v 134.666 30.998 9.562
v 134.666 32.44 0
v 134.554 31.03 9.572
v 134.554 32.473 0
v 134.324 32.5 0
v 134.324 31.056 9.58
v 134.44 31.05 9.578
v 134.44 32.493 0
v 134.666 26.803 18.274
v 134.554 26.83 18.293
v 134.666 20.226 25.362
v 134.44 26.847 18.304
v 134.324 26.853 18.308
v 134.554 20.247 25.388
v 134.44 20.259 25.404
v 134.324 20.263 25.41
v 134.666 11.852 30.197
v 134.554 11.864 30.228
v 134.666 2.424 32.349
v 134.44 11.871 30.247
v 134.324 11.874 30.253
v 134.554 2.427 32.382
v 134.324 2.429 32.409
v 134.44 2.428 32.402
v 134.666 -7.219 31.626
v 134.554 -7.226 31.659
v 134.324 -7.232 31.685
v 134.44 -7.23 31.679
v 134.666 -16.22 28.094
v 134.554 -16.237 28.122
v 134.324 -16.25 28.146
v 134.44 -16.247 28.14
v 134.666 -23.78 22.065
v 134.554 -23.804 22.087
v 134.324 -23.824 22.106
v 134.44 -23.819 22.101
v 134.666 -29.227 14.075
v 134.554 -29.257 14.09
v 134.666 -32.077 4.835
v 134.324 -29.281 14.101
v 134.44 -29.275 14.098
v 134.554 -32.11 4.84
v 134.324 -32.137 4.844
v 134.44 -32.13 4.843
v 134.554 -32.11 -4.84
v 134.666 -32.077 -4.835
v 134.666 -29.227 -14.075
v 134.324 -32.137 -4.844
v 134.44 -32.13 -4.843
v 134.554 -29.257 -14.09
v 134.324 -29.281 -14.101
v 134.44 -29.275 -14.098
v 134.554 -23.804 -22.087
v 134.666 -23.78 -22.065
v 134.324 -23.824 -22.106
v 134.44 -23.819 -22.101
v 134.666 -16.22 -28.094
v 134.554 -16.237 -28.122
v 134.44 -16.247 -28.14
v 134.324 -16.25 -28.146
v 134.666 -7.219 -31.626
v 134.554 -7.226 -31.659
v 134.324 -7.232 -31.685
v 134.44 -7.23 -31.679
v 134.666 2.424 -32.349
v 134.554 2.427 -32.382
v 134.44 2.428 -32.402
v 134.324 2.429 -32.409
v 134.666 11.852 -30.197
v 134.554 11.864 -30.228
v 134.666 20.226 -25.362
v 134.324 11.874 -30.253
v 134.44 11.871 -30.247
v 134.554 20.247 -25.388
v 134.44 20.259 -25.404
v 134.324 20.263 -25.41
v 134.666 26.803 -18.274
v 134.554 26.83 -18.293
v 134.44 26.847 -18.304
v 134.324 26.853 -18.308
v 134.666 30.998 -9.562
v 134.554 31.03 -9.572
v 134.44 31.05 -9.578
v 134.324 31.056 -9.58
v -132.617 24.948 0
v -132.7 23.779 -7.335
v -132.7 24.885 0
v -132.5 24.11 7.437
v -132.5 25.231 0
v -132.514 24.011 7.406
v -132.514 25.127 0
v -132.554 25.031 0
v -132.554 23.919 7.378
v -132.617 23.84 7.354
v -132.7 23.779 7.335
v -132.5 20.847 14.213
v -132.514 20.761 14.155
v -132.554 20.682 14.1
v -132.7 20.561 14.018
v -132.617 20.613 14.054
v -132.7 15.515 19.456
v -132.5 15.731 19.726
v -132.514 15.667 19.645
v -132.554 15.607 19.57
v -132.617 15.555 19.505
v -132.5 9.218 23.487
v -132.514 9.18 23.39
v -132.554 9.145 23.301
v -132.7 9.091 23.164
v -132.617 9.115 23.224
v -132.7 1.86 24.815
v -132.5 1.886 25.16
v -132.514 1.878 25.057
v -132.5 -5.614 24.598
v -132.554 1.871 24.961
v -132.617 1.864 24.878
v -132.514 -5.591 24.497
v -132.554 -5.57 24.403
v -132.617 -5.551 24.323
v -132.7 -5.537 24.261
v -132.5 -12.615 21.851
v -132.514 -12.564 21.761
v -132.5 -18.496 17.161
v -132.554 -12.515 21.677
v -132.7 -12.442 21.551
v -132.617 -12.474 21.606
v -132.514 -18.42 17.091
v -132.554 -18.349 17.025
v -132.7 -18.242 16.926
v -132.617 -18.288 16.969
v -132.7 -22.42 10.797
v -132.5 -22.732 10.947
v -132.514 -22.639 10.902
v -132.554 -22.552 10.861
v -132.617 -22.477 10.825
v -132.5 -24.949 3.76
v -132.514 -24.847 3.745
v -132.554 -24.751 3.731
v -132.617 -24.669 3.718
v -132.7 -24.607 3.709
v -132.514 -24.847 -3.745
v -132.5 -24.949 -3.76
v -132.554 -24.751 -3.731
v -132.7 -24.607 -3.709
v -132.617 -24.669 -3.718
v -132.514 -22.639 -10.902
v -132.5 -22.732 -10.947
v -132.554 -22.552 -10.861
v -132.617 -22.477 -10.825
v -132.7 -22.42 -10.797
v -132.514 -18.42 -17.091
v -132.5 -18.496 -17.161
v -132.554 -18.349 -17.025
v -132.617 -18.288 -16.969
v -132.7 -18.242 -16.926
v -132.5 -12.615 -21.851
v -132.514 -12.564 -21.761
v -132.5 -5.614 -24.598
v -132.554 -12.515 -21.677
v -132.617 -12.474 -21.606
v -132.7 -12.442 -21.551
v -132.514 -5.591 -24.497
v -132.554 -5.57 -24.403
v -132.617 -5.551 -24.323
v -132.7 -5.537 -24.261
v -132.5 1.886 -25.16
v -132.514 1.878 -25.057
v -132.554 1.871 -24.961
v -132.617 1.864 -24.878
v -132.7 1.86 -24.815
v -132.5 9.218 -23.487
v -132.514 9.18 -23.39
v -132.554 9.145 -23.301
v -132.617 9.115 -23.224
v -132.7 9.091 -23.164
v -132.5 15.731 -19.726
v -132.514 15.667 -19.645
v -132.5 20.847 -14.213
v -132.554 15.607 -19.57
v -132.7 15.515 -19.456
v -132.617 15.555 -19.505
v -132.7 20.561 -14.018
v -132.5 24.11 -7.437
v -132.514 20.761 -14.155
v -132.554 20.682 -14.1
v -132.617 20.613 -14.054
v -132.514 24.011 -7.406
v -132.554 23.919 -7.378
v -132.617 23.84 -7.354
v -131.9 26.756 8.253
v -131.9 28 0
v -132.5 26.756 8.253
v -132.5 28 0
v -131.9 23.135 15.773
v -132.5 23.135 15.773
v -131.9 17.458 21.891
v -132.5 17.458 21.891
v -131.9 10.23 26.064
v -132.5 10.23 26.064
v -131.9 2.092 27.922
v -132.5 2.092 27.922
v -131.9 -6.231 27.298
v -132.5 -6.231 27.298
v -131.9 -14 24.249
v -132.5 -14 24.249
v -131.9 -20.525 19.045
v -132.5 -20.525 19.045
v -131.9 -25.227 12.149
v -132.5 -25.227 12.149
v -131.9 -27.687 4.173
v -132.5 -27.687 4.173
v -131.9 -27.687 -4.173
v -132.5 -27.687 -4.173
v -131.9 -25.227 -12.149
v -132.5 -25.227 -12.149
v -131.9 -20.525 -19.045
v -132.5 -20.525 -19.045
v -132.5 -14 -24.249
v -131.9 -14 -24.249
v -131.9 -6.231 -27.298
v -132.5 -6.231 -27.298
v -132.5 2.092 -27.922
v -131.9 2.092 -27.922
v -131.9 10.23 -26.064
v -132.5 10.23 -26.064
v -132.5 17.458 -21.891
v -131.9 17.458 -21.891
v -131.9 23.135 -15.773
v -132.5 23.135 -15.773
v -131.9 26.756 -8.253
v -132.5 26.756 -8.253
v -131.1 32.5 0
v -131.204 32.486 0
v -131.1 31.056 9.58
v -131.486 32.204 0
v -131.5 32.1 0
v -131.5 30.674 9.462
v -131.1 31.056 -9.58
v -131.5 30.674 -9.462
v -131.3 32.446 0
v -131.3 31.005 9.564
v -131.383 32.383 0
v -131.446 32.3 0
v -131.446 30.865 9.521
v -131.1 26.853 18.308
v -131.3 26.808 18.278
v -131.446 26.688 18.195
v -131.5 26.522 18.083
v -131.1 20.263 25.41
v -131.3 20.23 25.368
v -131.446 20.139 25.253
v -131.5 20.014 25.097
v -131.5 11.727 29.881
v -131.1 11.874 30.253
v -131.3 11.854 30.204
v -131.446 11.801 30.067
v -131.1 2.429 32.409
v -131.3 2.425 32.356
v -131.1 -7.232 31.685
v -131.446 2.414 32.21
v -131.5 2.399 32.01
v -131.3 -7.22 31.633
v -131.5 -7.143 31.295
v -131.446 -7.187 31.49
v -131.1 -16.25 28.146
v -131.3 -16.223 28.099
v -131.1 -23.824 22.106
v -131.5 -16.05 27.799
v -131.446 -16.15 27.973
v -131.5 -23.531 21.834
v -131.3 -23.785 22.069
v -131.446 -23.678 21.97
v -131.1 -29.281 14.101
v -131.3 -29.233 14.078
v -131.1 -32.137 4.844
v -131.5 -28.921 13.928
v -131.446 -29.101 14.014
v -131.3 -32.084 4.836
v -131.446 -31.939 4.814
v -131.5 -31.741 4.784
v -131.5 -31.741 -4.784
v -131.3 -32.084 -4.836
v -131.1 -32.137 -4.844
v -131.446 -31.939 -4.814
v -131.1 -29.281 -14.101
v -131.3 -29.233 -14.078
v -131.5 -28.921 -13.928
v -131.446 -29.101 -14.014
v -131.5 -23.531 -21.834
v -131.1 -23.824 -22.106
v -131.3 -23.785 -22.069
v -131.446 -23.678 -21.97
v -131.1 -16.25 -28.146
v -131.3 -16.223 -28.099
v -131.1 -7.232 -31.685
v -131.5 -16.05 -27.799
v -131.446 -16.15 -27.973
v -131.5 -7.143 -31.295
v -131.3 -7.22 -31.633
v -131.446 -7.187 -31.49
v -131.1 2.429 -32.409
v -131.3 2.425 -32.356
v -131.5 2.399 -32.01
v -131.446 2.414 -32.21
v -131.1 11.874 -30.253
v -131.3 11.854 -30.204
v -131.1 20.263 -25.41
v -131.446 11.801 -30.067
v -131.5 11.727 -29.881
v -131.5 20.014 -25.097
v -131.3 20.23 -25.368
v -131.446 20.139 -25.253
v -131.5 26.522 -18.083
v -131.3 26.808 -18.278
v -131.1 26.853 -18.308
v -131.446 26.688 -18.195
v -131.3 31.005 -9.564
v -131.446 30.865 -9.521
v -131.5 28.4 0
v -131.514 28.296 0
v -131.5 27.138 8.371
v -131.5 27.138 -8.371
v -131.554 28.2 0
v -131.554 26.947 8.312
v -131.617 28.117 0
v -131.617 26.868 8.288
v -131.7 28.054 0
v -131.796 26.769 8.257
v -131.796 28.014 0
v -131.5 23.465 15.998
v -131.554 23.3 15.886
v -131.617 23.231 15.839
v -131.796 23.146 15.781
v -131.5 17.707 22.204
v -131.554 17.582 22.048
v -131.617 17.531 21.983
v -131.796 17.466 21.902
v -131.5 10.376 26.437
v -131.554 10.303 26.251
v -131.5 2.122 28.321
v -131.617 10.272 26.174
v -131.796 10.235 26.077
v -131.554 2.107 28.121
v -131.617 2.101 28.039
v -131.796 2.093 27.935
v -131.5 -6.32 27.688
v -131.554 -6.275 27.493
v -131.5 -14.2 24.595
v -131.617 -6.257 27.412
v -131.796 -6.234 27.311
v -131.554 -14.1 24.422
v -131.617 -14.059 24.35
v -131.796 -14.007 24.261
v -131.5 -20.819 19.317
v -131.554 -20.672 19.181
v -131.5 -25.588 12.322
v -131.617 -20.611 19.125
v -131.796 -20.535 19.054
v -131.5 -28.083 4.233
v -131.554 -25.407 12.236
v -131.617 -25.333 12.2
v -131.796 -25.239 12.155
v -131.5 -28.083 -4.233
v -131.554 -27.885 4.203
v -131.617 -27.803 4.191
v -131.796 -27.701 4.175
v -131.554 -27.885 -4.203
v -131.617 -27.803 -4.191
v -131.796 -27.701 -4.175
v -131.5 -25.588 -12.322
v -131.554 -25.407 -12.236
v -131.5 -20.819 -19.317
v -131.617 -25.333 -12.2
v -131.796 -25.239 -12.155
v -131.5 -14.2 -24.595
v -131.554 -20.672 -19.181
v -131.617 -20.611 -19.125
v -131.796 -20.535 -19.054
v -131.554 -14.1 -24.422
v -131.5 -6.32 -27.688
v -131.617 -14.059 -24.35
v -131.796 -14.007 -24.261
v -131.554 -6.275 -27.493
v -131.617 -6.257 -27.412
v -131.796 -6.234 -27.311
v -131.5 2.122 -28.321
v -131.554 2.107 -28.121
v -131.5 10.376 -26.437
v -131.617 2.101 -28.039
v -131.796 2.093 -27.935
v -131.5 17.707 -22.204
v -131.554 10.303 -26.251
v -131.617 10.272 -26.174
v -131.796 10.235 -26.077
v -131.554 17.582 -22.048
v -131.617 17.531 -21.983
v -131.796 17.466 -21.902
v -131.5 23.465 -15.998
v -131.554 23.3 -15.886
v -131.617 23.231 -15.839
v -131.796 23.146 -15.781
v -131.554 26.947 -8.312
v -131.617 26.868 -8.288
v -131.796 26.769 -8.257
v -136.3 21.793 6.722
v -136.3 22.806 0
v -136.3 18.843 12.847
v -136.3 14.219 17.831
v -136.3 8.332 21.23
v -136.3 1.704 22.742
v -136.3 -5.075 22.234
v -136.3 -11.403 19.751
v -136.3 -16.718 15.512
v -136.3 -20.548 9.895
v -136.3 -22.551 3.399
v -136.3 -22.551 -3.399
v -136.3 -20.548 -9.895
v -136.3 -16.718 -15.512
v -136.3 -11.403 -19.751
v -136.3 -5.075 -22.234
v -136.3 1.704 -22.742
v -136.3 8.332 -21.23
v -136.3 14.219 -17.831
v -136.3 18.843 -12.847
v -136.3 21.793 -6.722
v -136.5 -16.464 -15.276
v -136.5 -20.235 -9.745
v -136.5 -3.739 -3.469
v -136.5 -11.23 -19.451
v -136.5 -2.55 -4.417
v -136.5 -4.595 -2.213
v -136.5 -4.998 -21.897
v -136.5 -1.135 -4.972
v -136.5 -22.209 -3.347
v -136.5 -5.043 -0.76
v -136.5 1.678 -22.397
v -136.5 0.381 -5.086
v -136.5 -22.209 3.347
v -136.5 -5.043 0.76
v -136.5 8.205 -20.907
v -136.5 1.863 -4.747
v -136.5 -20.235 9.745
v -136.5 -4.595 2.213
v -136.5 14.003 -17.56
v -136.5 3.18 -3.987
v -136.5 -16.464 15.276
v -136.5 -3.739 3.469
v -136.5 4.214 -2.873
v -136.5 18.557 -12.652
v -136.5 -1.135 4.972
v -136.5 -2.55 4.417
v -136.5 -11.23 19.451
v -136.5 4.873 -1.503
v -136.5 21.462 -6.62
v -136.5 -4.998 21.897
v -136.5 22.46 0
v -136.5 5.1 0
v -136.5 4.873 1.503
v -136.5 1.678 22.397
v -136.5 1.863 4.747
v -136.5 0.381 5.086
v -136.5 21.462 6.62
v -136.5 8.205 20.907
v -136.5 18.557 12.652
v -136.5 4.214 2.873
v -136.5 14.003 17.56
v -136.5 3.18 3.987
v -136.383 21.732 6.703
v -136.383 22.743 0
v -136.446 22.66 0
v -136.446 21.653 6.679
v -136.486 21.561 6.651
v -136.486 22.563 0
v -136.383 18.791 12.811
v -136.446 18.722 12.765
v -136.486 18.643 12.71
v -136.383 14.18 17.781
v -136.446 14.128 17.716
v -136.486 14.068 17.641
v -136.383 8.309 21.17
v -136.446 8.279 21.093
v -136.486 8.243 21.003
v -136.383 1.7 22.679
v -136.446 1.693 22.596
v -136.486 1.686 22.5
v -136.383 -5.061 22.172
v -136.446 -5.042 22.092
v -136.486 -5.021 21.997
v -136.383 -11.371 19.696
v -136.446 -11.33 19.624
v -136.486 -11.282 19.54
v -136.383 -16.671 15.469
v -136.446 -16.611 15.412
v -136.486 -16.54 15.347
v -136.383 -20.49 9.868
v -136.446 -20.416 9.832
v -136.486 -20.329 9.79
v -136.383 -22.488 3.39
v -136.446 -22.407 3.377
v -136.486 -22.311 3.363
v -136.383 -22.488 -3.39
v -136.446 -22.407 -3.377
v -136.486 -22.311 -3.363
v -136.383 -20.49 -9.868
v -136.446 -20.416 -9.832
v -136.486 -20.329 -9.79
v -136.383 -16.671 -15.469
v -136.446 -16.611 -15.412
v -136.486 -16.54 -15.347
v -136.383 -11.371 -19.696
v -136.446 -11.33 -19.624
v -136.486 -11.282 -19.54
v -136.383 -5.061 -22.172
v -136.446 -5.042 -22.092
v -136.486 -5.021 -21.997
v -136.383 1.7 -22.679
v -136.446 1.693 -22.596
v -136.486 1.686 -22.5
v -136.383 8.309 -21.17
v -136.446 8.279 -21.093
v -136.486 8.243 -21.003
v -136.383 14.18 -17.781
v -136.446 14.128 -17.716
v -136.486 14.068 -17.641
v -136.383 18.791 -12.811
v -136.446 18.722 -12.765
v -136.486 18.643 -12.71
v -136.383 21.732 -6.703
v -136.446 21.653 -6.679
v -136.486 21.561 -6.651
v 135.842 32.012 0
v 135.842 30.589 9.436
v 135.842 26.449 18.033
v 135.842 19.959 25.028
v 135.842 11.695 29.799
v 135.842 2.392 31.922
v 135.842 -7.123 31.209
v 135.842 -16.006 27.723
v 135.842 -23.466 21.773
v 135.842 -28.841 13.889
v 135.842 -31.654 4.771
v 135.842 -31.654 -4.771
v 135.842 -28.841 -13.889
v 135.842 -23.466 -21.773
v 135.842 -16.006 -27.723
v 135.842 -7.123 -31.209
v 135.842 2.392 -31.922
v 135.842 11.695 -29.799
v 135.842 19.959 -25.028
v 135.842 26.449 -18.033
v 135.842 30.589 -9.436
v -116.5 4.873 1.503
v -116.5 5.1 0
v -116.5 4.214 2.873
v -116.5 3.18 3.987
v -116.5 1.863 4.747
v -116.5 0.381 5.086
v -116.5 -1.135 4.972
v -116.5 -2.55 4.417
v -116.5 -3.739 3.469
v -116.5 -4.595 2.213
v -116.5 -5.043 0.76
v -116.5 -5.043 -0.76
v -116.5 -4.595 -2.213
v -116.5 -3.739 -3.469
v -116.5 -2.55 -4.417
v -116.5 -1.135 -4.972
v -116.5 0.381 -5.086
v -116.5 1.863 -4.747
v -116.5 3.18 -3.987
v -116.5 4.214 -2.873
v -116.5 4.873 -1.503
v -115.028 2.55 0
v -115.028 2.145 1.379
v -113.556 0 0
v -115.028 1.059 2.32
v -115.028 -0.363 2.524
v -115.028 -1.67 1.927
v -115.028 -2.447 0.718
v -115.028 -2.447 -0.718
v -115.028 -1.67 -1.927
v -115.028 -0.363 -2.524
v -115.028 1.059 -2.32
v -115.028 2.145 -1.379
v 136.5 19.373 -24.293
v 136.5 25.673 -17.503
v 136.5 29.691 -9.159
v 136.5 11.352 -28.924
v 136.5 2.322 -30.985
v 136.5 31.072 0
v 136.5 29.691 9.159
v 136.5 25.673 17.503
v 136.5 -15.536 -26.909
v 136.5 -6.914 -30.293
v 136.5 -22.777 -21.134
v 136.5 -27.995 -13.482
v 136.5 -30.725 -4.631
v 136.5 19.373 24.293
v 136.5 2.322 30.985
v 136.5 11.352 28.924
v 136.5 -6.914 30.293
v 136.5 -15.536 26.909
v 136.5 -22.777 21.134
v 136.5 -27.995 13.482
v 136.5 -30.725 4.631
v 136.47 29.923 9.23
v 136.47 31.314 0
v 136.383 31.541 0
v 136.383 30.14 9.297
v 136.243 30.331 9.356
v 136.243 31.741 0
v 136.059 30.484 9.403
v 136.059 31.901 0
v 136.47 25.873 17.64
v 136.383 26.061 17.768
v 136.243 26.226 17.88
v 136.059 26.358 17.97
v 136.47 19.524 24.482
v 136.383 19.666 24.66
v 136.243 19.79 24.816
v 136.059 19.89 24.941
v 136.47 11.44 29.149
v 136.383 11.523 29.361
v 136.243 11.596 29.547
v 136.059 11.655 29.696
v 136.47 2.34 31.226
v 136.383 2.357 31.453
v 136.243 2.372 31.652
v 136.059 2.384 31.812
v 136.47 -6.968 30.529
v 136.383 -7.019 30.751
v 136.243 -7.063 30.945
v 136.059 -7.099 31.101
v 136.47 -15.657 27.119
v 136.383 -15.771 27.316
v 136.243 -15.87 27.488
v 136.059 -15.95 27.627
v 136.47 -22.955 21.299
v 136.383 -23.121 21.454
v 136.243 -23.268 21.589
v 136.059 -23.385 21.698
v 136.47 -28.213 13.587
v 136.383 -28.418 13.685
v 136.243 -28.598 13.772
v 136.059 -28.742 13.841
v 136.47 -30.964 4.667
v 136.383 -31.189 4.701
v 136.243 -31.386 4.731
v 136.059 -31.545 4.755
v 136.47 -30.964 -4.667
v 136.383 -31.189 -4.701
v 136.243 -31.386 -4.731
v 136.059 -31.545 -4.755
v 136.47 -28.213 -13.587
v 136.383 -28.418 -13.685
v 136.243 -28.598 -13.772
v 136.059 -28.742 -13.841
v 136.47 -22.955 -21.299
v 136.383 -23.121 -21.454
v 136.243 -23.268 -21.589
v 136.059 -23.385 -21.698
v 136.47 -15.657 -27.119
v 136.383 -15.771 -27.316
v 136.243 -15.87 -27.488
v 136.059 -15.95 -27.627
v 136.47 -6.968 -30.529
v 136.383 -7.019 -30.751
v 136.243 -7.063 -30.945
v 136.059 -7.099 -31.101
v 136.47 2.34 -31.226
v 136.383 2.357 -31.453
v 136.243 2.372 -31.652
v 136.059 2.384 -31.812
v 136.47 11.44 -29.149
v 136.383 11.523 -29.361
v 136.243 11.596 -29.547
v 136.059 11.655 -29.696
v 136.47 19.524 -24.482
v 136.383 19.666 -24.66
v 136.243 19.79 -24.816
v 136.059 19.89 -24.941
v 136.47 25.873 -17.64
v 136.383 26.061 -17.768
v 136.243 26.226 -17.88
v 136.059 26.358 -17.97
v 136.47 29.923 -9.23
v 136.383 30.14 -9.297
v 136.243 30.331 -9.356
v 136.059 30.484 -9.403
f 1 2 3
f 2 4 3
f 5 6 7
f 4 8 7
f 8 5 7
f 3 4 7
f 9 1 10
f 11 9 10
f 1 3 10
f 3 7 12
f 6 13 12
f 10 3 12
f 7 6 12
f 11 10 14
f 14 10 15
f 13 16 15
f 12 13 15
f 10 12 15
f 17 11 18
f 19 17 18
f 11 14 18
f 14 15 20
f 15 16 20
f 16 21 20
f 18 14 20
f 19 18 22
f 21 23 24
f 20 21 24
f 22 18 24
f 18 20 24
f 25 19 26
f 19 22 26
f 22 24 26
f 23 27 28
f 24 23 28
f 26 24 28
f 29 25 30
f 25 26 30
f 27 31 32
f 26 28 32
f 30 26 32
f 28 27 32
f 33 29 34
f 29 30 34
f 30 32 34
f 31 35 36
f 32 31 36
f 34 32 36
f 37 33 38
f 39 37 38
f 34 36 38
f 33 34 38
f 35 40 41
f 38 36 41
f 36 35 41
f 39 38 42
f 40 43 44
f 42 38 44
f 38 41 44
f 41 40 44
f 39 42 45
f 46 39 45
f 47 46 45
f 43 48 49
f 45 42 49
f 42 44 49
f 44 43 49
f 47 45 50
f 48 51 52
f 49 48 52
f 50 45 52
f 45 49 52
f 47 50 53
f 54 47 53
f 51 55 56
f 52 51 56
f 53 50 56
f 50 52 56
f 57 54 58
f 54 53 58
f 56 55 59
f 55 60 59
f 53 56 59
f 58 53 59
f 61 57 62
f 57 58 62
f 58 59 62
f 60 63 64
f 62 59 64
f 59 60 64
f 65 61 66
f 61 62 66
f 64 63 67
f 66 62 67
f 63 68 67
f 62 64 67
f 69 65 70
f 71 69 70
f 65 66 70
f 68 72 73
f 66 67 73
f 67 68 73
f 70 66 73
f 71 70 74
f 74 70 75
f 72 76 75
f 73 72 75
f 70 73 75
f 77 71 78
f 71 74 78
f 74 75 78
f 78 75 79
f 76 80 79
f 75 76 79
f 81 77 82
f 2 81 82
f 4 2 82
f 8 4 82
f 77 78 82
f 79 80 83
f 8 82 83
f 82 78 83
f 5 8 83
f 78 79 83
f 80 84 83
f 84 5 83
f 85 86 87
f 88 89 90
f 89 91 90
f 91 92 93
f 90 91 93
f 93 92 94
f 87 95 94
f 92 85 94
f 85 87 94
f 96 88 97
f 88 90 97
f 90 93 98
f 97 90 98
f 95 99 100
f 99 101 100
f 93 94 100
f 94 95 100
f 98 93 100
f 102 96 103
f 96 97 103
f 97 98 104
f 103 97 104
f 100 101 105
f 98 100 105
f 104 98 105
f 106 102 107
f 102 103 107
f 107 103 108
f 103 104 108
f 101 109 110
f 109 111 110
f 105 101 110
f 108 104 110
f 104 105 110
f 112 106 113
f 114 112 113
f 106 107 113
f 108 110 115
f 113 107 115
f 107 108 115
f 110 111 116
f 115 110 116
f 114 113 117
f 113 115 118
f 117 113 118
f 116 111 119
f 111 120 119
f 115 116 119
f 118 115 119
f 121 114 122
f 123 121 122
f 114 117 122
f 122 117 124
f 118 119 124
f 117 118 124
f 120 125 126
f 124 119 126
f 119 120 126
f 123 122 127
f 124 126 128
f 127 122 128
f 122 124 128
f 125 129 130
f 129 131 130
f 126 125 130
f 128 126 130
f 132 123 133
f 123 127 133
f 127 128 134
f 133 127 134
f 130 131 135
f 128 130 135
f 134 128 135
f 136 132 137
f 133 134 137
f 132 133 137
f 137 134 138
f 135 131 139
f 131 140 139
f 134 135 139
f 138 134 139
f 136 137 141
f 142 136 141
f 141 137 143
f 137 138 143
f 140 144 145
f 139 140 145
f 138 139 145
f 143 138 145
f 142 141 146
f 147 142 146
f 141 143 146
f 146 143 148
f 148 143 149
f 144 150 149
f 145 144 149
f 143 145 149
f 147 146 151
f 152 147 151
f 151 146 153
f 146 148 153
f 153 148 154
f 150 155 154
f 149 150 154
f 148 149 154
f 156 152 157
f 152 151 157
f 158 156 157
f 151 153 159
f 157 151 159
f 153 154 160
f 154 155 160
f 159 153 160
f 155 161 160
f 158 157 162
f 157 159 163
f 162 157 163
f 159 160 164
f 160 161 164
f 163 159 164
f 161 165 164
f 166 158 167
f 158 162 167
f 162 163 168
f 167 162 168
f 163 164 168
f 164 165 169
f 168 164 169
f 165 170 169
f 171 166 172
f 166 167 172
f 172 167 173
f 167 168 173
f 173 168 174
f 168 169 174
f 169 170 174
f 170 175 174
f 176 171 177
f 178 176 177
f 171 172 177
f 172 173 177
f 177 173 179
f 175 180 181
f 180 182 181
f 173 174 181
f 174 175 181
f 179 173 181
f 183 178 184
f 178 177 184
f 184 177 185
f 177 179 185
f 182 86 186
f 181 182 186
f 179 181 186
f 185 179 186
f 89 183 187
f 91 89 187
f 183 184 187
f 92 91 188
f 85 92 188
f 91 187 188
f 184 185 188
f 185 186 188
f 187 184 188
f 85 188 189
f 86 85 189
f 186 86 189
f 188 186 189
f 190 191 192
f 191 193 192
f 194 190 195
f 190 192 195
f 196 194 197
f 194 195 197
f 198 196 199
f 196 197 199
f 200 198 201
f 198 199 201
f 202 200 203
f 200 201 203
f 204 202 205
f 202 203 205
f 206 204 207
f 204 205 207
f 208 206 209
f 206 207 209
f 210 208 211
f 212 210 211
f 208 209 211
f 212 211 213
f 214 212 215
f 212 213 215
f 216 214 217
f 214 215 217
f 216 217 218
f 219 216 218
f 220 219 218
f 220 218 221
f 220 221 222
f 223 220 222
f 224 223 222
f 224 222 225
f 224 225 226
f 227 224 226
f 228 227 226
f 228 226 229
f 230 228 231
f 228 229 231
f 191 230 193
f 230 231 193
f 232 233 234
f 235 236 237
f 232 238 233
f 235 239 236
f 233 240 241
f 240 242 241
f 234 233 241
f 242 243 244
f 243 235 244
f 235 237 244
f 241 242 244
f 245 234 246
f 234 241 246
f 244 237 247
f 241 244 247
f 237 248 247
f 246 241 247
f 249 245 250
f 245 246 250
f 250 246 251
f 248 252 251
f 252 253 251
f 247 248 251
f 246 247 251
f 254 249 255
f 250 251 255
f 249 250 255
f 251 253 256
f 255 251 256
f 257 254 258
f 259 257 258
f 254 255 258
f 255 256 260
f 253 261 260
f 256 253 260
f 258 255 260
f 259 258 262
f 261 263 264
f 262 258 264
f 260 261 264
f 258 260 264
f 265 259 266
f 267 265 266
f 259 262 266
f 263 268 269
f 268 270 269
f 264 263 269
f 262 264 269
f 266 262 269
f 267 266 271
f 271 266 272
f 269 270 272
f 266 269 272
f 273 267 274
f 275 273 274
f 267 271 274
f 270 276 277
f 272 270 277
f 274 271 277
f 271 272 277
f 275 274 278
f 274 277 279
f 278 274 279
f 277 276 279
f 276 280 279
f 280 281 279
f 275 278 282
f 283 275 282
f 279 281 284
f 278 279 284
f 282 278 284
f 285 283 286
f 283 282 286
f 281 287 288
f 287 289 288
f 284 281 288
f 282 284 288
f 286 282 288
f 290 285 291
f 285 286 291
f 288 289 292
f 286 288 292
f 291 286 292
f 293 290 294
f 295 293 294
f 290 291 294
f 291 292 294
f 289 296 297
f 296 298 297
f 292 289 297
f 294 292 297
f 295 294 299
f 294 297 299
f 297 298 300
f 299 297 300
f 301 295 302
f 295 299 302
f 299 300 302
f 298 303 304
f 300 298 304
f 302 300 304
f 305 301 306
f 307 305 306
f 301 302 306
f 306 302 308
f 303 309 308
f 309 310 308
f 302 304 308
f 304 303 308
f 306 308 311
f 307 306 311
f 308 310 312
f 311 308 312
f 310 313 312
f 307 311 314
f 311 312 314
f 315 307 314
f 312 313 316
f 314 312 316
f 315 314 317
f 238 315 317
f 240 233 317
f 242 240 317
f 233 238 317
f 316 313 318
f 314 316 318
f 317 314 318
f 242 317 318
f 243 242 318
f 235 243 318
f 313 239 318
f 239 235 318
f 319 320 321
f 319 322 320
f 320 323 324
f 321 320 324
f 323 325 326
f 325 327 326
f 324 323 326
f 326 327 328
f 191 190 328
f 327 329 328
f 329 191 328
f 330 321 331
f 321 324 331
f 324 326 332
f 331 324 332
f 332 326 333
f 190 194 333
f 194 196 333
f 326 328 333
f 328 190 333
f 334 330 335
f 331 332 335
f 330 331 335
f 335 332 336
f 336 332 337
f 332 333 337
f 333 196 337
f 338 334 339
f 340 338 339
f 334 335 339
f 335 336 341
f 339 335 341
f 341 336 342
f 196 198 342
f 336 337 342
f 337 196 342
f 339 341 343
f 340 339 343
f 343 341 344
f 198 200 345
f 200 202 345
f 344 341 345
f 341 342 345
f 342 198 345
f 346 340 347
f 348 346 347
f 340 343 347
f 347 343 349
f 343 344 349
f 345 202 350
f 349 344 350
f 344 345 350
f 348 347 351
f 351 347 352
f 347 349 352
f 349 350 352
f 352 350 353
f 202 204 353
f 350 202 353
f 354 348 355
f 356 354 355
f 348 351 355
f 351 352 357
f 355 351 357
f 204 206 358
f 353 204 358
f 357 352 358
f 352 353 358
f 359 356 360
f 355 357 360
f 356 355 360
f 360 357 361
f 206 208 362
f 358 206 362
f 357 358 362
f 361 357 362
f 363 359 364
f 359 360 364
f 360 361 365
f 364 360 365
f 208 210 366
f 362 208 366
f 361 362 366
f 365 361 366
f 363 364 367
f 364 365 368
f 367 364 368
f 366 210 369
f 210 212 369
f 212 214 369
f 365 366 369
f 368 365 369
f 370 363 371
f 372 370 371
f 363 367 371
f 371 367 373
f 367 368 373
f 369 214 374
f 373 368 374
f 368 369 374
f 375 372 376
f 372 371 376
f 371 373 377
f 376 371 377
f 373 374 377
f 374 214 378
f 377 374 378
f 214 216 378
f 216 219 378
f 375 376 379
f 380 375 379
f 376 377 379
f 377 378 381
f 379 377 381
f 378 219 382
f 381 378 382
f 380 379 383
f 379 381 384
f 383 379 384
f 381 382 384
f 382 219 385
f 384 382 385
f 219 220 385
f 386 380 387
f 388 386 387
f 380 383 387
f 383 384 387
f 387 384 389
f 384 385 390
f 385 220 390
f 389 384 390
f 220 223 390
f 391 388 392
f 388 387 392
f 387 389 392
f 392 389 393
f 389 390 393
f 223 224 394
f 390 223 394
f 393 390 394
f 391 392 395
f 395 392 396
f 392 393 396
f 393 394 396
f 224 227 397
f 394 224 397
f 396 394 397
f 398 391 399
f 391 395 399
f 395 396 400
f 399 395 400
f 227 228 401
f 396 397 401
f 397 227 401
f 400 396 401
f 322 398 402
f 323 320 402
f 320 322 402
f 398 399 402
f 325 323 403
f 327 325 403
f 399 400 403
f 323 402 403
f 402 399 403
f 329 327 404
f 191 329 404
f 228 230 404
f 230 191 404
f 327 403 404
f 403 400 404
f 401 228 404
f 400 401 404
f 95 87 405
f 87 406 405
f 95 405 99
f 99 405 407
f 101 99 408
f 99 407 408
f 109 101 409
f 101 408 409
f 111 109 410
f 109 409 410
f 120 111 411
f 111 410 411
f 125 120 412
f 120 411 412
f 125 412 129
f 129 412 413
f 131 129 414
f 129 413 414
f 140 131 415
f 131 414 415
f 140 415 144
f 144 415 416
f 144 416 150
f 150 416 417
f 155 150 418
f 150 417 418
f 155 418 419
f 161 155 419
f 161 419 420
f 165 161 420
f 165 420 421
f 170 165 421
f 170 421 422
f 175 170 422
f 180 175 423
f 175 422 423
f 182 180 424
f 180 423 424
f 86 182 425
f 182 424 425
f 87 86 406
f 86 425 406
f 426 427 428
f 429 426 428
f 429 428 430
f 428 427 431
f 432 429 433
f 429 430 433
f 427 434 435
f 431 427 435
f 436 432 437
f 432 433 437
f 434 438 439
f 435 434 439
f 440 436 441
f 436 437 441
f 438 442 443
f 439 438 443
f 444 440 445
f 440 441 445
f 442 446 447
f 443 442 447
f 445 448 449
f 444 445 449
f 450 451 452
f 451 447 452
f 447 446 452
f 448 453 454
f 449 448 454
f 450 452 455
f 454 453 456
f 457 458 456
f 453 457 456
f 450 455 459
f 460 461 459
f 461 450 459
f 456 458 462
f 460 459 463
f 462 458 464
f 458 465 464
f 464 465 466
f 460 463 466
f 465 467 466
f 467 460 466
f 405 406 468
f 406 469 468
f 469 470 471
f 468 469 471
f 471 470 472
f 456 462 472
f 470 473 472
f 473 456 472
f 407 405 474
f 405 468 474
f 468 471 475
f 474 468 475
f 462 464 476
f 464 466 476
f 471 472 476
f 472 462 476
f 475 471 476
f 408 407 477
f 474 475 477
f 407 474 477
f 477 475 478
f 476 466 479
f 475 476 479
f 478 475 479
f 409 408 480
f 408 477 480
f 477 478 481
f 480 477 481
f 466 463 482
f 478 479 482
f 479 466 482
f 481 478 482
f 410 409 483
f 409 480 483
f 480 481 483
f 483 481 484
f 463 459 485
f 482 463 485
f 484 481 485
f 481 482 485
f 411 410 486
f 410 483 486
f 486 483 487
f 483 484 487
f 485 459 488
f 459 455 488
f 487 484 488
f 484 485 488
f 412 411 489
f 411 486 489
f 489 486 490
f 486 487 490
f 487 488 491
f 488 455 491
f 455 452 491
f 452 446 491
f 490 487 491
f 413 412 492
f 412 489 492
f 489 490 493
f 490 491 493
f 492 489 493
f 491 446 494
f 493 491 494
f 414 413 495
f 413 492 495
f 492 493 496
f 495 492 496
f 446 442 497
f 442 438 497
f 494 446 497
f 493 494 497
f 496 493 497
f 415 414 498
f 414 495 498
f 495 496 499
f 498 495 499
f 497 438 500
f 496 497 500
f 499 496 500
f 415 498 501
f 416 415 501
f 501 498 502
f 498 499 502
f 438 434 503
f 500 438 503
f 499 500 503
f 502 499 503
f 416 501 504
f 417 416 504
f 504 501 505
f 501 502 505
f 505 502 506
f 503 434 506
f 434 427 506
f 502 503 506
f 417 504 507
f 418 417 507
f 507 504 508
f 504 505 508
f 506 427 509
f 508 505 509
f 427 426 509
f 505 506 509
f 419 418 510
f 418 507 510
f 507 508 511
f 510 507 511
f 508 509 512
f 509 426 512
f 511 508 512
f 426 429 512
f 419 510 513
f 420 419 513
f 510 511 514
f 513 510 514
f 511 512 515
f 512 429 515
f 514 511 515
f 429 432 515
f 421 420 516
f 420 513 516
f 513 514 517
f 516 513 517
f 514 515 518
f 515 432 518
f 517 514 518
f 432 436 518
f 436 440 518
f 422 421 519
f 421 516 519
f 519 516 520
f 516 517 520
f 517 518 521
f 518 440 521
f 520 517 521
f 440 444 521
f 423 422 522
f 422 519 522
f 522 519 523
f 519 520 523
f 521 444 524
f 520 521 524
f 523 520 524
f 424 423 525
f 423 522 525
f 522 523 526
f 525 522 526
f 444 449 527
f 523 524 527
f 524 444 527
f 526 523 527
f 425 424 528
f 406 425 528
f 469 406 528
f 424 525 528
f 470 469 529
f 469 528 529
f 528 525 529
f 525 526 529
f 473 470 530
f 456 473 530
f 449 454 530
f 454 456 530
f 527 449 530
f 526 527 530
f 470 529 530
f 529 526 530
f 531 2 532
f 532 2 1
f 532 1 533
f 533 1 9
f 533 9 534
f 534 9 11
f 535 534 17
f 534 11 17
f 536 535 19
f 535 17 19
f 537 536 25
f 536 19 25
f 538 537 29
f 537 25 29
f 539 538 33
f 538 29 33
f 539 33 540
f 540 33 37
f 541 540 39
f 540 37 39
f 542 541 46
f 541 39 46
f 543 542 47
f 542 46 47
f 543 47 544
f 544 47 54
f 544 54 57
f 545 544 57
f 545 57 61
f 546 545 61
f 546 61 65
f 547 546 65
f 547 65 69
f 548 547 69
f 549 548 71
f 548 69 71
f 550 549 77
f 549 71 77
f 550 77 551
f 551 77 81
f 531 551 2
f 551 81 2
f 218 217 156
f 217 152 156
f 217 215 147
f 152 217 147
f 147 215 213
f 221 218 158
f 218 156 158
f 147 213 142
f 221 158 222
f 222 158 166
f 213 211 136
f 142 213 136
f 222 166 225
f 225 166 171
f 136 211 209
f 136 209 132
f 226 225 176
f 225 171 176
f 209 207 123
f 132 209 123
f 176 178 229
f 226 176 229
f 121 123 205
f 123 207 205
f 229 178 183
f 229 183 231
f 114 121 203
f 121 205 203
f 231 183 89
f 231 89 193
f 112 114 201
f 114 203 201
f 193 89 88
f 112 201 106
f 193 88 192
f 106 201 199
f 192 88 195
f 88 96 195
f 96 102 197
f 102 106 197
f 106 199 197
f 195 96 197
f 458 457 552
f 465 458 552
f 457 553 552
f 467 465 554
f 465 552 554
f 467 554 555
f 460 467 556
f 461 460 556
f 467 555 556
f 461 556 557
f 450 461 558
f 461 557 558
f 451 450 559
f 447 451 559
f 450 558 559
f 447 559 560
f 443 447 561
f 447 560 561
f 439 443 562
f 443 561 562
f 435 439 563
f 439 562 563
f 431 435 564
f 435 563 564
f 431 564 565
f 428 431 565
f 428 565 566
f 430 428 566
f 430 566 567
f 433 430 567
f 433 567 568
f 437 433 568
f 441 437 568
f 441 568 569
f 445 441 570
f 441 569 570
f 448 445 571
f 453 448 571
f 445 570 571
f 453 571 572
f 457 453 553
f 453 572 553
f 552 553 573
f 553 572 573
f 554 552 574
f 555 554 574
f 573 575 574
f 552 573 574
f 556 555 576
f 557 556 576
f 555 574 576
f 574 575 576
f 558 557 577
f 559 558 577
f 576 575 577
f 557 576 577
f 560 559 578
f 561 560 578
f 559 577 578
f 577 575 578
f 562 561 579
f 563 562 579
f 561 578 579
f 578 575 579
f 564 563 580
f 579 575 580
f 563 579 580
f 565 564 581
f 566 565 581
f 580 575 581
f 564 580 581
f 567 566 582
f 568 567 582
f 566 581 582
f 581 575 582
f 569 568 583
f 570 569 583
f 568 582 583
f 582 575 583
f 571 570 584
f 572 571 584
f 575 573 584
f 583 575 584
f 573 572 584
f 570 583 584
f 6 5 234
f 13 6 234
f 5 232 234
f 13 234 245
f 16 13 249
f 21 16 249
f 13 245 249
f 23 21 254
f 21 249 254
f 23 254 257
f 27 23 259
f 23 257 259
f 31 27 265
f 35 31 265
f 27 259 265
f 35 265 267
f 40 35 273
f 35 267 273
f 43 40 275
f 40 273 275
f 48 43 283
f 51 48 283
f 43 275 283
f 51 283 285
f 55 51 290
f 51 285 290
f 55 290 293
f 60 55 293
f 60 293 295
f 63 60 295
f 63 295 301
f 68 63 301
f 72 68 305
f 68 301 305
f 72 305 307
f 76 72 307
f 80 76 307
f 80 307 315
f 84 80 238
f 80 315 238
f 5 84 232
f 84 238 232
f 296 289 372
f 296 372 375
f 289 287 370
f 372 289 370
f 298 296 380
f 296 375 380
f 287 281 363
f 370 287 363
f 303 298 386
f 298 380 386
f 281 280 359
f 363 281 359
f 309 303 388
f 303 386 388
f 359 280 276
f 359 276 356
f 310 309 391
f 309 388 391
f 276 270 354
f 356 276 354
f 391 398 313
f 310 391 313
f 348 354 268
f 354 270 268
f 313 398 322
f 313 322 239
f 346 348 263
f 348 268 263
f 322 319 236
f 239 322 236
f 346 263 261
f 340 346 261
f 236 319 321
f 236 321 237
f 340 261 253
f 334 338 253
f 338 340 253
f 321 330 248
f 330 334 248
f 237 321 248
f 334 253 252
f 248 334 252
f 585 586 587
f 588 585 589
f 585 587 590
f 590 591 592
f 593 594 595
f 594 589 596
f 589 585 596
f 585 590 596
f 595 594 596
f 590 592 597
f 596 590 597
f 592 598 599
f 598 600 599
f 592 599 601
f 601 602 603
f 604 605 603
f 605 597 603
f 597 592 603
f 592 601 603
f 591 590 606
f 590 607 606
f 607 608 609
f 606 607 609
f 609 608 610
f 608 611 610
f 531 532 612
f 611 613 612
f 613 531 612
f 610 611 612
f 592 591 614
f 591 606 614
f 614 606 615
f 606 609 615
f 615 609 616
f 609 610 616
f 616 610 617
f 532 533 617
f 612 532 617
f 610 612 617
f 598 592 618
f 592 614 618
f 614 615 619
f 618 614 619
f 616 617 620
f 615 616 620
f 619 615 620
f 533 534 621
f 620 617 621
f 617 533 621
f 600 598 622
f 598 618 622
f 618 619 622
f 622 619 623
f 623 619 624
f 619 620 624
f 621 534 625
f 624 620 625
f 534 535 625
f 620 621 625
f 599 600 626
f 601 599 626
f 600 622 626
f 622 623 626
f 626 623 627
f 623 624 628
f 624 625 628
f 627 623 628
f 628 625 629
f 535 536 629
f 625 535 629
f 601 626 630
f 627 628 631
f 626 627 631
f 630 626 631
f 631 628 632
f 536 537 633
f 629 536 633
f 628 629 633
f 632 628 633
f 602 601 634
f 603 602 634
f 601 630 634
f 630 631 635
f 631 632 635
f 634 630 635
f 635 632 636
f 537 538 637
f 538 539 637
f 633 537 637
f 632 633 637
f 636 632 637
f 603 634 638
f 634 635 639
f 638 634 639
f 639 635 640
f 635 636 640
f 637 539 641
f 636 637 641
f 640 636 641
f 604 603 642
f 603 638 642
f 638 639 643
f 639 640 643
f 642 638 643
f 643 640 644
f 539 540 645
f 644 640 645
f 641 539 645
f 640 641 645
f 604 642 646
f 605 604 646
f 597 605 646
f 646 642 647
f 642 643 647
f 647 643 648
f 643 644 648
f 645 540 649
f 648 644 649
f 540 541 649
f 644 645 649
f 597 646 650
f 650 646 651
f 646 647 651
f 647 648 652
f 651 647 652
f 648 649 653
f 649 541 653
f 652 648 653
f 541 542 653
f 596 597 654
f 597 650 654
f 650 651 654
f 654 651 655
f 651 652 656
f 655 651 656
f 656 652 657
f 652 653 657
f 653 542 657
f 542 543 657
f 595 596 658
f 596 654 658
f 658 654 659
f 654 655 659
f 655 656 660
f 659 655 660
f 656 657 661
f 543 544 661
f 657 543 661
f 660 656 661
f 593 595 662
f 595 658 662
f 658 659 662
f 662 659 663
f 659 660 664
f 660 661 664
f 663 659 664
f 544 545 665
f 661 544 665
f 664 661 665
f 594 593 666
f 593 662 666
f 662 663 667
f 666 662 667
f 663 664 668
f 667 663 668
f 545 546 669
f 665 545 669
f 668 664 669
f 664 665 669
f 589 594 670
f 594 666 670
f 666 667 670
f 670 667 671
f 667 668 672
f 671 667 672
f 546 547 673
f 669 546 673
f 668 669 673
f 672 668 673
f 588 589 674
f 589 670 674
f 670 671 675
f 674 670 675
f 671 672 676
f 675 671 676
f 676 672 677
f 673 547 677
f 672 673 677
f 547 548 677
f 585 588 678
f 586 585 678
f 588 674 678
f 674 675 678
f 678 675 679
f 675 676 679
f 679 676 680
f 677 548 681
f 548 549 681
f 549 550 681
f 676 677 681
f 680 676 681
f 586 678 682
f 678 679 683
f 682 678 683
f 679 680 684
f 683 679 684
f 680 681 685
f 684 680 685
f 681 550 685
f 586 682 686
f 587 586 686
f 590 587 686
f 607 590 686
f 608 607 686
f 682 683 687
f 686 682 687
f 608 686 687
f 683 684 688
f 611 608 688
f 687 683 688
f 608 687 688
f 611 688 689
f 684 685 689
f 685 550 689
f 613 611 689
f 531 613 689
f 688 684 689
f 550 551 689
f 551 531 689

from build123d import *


with BuildPart() as part:
    # Sketch1 → Base-Revolve (revolve)
    with BuildSketch(Plane.XY):
        with BuildLine():
            Line((134.323673019, 32.5), (-9.4019e-05, 32.5))
            Line((-9.4019e-05, 32.5), (-131.1, 32.5))
            ThreePointArc((-131.1, 32.5), (-131.382842712, 32.382842712), (-131.5, 32.1))
            Line((-131.5, 32.1), (-131.5, 28.4))
            ThreePointArc((-131.5, 28.4), (-131.617157288, 28.117157288), (-131.9, 28))
            Line((-131.9, 28), (-132.5, 28))
            Line((-132.5, 28), (-132.5, 25.230940108))
            ThreePointArc((-132.5, 25.230940108), (-132.553589838, 25.030940108), (-132.7, 24.884529946))
            Line((-132.7, 24.884529946), (-136.3, 22.806068977))
            ThreePointArc((-136.3, 22.806068977), (-136.446410162, 22.659658816), (-136.5, 22.459658816))
            Line((-136.5, 22.459658816), (-136.5, 5.1))
            Line((-136.5, 5.1), (-116.5, 5.1))
            Line((-116.5, 5.1), (-113.555513627, 0))
            Line((-113.555513627, 0), (136.5, 0))
            Line((136.5, 0), (136.5, 31.071851993))
            ThreePointArc((136.5, 31.071851993), (136.319152044, 31.64542843), (135.842020143, 32.011544614))
            Line((135.842020143, 32.011544614), (134.665693163, 32.439692621))
            ThreePointArc((134.665693163, 32.439692621), (134.497321197, 32.484807753), (134.323673019, 32.5))
        make_face()
    revolve(axis=Axis((-136.5, 0, 0), (1, 0, 0)))


solid = part.part
